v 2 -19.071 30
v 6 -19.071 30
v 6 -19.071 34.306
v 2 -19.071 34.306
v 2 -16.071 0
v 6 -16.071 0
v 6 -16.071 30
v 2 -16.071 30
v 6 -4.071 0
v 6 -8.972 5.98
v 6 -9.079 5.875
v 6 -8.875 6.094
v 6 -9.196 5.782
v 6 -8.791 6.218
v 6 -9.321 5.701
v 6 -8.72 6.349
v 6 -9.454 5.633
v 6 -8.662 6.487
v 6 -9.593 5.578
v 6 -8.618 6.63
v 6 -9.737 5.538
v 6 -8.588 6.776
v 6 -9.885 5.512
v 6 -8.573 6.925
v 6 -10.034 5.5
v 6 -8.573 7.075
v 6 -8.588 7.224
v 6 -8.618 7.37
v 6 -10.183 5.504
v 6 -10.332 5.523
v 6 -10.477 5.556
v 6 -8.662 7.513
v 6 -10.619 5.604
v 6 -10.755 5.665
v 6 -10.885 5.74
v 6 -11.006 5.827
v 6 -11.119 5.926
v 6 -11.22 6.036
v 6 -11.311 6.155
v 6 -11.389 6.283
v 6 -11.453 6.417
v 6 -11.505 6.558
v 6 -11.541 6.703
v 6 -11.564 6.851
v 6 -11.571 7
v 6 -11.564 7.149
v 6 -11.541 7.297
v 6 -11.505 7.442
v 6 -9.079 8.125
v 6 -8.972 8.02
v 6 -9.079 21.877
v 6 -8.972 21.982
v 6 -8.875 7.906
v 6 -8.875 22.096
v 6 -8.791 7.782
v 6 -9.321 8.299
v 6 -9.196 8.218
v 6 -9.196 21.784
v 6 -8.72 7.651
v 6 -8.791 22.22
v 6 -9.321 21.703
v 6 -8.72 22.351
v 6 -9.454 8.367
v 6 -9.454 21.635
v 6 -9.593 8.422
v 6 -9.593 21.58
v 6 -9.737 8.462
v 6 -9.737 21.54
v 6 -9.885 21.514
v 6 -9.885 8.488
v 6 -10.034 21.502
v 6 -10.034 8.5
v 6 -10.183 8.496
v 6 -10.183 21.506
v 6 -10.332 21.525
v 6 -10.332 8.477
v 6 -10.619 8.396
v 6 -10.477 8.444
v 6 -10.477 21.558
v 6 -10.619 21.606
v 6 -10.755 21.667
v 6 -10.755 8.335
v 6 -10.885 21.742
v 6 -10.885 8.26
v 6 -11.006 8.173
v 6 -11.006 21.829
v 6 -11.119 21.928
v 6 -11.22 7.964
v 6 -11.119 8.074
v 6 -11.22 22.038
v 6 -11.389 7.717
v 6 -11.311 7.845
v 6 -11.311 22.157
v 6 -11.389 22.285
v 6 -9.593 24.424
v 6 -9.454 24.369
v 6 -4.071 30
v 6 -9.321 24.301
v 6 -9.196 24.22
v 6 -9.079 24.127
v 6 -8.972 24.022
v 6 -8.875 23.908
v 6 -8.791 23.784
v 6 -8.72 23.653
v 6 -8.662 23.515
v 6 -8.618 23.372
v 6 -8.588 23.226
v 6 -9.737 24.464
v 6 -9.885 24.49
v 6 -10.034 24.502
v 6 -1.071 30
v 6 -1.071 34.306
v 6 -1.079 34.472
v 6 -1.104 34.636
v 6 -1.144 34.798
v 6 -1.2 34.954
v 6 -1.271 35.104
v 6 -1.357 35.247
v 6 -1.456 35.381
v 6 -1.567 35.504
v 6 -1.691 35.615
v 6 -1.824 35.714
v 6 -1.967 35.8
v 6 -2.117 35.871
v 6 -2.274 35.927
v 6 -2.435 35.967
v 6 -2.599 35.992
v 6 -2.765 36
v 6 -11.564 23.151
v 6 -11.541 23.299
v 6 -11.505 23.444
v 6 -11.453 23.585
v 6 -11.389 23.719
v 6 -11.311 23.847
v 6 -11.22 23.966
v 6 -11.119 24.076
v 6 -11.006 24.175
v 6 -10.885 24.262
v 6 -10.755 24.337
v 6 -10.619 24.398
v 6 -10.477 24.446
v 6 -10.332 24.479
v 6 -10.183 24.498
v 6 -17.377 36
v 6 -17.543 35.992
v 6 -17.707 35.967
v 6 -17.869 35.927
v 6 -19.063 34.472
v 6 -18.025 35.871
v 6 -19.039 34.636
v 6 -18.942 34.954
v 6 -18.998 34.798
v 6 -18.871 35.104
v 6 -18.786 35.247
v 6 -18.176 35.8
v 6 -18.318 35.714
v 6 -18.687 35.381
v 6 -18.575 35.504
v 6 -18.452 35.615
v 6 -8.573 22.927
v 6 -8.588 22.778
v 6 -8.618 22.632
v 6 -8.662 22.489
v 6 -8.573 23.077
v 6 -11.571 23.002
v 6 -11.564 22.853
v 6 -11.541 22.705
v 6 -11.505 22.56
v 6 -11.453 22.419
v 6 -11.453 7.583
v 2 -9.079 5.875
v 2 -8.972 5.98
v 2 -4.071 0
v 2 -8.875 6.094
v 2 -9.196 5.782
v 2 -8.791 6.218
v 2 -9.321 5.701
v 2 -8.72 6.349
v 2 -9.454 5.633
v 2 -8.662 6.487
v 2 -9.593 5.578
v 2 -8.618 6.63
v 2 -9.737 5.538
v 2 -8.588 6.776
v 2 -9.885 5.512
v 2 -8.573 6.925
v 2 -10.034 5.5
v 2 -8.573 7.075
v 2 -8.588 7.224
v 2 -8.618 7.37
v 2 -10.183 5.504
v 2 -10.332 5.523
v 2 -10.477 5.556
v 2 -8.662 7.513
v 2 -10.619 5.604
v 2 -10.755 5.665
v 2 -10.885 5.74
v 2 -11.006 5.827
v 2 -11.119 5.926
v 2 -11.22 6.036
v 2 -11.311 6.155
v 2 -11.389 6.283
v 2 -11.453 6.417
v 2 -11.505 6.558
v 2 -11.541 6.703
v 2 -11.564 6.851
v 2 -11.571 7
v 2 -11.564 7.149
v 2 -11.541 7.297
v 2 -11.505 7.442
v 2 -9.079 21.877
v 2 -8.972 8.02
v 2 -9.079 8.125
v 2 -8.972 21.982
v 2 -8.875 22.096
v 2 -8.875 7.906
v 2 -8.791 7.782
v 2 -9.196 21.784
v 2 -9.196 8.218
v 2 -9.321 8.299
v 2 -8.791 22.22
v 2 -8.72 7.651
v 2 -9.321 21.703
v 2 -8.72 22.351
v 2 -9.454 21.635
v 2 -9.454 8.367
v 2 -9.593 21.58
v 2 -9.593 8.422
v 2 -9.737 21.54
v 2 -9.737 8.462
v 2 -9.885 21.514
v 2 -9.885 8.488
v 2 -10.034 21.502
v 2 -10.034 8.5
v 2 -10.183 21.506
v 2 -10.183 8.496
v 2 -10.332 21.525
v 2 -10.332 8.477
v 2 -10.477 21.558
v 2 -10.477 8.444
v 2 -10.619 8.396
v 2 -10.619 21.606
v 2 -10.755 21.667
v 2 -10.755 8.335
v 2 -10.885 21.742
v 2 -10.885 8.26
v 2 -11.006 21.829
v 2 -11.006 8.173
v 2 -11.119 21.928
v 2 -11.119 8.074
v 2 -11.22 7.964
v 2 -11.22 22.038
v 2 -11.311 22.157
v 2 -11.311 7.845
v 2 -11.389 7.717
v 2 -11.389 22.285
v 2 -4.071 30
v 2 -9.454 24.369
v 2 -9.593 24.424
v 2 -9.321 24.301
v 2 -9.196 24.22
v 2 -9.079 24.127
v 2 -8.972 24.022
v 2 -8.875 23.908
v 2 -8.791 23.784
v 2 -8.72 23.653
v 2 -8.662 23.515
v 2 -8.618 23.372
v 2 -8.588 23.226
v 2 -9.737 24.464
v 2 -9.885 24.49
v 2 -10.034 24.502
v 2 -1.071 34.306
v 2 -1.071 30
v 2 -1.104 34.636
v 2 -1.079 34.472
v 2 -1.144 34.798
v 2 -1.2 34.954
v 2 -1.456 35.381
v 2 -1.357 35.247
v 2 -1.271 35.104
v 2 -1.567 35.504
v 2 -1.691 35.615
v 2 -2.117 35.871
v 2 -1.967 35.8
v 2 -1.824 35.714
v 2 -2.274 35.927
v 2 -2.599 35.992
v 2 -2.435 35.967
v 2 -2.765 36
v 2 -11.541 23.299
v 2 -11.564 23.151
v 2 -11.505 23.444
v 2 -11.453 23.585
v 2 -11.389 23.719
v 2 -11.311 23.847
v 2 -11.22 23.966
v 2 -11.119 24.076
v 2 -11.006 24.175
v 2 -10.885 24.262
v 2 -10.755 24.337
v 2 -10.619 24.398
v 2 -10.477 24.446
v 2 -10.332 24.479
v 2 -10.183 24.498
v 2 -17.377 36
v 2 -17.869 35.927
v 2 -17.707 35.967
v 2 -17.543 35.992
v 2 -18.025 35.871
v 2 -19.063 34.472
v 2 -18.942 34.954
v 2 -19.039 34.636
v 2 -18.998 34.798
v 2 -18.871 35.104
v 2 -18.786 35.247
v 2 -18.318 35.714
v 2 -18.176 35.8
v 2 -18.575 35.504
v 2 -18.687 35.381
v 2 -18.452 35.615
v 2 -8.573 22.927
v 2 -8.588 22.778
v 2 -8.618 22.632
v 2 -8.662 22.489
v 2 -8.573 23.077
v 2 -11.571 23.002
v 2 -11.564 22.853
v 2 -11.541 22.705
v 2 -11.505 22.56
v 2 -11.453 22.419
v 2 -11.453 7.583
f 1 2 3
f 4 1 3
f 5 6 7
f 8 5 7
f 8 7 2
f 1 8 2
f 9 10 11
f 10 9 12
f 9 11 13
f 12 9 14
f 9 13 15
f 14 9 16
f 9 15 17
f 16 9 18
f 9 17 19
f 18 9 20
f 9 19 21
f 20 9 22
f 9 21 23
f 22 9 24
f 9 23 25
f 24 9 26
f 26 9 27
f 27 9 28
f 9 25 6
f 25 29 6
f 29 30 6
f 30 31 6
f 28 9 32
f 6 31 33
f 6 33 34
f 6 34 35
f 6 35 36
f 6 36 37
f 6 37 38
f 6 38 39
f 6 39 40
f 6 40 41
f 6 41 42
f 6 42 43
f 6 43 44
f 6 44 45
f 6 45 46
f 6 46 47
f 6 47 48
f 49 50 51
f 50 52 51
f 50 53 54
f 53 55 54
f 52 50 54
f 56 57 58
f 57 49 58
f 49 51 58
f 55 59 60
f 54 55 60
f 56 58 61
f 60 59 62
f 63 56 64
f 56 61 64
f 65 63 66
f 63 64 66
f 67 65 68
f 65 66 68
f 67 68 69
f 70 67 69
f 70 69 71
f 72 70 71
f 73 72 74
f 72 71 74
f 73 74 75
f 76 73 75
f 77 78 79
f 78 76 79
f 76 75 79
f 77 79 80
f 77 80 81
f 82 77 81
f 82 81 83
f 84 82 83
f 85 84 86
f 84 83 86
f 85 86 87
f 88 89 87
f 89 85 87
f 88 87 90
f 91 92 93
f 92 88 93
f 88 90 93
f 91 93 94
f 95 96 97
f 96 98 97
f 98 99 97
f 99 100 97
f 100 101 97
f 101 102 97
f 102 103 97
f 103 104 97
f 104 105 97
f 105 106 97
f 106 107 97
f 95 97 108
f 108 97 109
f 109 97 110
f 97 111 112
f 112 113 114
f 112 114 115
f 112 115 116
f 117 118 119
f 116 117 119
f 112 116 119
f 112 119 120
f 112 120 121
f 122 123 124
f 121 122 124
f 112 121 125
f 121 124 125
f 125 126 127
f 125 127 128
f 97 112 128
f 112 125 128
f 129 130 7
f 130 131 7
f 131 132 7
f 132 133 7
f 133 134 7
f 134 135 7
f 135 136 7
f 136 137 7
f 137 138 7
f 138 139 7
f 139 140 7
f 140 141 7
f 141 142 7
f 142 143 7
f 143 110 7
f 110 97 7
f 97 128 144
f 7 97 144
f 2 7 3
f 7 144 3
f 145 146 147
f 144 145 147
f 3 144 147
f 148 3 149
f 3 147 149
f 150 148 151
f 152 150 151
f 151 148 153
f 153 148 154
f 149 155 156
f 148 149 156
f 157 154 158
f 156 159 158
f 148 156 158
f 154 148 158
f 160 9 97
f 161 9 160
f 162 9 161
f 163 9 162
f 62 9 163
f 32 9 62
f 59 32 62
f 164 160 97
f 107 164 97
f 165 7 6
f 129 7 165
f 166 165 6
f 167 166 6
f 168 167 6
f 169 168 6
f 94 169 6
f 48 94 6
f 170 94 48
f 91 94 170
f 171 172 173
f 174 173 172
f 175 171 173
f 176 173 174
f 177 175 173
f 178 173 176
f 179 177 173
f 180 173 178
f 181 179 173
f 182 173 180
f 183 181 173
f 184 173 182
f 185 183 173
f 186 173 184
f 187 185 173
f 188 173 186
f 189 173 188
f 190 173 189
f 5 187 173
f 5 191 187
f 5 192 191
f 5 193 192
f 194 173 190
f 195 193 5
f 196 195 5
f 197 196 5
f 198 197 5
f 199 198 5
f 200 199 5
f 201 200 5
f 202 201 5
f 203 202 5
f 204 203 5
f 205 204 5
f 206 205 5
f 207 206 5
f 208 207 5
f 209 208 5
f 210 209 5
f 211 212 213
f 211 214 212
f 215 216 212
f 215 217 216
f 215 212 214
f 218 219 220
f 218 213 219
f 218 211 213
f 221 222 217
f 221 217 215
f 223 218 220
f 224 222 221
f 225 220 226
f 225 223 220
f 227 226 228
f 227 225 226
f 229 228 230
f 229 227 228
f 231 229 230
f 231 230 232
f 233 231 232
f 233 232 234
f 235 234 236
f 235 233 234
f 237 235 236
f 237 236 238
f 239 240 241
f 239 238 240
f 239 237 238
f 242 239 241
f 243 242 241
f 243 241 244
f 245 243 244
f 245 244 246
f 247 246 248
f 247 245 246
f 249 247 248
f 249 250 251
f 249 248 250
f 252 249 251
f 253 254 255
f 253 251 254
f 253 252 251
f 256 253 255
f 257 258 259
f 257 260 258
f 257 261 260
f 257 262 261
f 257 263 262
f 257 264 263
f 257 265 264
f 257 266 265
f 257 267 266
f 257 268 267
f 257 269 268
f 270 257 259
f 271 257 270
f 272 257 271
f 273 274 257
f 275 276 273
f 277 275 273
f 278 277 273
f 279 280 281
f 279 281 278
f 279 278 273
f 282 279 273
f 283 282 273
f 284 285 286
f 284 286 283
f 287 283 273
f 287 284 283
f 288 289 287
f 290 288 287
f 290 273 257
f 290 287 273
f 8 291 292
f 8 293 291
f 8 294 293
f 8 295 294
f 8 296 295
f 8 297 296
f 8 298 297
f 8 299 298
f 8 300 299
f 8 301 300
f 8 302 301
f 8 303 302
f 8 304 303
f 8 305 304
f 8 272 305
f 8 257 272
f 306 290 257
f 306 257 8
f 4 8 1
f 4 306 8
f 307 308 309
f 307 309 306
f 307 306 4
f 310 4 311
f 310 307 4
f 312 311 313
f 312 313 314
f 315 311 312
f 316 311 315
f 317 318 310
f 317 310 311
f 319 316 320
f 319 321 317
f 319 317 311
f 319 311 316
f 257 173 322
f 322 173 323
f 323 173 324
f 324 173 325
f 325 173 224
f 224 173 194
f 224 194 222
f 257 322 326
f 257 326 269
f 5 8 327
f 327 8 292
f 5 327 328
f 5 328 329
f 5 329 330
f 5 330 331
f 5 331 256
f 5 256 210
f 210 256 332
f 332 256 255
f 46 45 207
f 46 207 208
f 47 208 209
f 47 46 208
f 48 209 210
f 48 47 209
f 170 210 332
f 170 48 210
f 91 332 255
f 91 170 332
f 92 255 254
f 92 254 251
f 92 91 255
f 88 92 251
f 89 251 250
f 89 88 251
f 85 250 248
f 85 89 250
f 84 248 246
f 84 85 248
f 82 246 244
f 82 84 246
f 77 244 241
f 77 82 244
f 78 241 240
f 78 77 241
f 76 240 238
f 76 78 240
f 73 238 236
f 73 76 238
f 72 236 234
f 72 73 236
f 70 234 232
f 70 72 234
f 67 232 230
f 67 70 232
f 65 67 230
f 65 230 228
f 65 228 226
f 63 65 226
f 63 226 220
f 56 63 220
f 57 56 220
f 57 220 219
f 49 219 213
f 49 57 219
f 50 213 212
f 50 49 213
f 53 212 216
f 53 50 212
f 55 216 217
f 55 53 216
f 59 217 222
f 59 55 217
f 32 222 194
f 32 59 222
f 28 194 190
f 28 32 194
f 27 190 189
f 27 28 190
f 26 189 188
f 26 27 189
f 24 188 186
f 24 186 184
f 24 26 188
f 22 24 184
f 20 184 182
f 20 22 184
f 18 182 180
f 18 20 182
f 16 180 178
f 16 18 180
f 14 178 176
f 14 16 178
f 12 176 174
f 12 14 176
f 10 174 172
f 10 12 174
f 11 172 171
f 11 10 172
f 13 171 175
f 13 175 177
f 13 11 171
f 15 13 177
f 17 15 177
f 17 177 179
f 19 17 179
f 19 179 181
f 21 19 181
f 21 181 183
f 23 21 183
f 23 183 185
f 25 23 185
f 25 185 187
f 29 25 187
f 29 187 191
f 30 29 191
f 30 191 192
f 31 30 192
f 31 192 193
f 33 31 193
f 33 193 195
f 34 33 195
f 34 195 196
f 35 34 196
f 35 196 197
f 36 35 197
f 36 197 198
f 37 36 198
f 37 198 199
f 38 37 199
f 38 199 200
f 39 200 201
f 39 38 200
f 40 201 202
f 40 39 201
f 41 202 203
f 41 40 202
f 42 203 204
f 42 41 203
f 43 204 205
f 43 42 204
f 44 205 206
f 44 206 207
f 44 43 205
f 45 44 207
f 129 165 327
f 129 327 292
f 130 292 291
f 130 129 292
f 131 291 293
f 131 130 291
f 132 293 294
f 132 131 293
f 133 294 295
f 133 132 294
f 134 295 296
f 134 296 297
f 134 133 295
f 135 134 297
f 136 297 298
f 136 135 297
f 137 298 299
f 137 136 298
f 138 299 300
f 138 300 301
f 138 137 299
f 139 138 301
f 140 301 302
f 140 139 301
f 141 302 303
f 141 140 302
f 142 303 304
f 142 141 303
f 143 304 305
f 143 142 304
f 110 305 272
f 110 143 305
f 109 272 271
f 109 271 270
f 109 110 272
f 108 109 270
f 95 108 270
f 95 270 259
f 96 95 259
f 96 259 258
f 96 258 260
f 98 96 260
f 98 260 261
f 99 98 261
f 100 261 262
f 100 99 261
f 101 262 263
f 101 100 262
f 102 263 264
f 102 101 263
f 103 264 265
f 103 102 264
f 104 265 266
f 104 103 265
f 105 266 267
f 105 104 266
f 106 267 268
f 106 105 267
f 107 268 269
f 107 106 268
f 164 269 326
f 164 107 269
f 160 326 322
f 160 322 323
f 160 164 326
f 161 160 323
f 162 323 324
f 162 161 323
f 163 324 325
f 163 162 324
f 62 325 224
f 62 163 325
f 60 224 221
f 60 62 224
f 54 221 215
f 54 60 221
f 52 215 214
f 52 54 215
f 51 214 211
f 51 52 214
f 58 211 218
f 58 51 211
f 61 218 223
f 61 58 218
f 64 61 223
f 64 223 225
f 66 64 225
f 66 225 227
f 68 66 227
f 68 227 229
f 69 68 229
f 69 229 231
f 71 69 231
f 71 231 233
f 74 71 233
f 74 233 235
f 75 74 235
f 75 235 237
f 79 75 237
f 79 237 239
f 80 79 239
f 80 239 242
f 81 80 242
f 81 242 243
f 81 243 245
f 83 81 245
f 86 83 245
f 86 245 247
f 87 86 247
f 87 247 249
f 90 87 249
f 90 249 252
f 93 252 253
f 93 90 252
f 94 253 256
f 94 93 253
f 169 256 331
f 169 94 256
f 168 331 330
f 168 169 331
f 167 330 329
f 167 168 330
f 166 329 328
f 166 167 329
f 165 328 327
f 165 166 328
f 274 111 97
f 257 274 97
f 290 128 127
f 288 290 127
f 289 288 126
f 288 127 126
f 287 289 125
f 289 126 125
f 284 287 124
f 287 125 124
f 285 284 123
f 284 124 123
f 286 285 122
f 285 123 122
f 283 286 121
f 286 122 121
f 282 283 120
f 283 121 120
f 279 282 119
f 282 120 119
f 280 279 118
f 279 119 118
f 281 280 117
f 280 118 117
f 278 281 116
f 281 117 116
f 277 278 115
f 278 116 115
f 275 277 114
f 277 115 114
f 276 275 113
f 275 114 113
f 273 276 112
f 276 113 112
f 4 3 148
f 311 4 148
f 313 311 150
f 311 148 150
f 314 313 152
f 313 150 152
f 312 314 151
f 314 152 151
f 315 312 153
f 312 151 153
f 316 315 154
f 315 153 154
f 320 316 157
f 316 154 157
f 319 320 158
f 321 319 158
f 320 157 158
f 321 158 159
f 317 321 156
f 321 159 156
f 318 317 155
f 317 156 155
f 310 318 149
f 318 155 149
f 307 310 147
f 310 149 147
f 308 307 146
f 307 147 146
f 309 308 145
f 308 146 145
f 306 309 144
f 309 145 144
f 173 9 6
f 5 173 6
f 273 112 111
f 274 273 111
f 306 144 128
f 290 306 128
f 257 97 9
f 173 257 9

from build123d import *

# Parameters (mm, degrees)
F0_R     = 1.5
F1_DEPTH = 4
F2_ANGLE = 90
F4_ANGLE = 90


with BuildPart() as f1:
    # F0 (on Top) → F1 (new body)
    with BuildSketch(Plane.XY):
        with BuildLine():
            Line((-6, 13.9288183318), (-6, -16.0711816682))
            Line((-6, -16.0711816682), (6, -16.0711816682))
            Line((6, -16.0711816682), (6, 13.9288183318))
            Line((6, 13.9288183318), (9, 13.9288183318))
            Line((9, 13.9288183318), (9, 18.2345626692))
            ThreePointArc((9, 18.2345626692), (8.5037640055, 19.4325823373), (7.3057443374, 19.9288183318))
            Line((7.3057443374, 19.9288183318), (-7.3057443374, 19.9288183318))
            ThreePointArc((-7.3057443374, 19.9288183318), (-8.5037640055, 19.4325823373), (-9, 18.2345626692))
            Line((-9, 18.2345626692), (-9, 13.9288183318))
            Line((-9, 13.9288183318), (-6, 13.9288183318))
        make_face()
        with Locations((0, -9.0711816682)):
            Circle(F0_R, mode=Mode.SUBTRACT)
        with Locations((0, 6.9308183318)):
            Circle(F0_R, mode=Mode.SUBTRACT)
    extrude(amount=F1_DEPTH)


with BuildPart() as f1_1:
    # F2: moved
    add(f1.part.rotate(Axis((0, -16.0711816682, 0), (1, 0, 0)), F2_ANGLE))


with BuildPart() as f1_2:
    # F4: moved
    add(f1_1.part.rotate(Axis((6, -16.0711816682, 1.3093175367), (0, 0, -1)), F4_ANGLE))


solid = f1_2.part
